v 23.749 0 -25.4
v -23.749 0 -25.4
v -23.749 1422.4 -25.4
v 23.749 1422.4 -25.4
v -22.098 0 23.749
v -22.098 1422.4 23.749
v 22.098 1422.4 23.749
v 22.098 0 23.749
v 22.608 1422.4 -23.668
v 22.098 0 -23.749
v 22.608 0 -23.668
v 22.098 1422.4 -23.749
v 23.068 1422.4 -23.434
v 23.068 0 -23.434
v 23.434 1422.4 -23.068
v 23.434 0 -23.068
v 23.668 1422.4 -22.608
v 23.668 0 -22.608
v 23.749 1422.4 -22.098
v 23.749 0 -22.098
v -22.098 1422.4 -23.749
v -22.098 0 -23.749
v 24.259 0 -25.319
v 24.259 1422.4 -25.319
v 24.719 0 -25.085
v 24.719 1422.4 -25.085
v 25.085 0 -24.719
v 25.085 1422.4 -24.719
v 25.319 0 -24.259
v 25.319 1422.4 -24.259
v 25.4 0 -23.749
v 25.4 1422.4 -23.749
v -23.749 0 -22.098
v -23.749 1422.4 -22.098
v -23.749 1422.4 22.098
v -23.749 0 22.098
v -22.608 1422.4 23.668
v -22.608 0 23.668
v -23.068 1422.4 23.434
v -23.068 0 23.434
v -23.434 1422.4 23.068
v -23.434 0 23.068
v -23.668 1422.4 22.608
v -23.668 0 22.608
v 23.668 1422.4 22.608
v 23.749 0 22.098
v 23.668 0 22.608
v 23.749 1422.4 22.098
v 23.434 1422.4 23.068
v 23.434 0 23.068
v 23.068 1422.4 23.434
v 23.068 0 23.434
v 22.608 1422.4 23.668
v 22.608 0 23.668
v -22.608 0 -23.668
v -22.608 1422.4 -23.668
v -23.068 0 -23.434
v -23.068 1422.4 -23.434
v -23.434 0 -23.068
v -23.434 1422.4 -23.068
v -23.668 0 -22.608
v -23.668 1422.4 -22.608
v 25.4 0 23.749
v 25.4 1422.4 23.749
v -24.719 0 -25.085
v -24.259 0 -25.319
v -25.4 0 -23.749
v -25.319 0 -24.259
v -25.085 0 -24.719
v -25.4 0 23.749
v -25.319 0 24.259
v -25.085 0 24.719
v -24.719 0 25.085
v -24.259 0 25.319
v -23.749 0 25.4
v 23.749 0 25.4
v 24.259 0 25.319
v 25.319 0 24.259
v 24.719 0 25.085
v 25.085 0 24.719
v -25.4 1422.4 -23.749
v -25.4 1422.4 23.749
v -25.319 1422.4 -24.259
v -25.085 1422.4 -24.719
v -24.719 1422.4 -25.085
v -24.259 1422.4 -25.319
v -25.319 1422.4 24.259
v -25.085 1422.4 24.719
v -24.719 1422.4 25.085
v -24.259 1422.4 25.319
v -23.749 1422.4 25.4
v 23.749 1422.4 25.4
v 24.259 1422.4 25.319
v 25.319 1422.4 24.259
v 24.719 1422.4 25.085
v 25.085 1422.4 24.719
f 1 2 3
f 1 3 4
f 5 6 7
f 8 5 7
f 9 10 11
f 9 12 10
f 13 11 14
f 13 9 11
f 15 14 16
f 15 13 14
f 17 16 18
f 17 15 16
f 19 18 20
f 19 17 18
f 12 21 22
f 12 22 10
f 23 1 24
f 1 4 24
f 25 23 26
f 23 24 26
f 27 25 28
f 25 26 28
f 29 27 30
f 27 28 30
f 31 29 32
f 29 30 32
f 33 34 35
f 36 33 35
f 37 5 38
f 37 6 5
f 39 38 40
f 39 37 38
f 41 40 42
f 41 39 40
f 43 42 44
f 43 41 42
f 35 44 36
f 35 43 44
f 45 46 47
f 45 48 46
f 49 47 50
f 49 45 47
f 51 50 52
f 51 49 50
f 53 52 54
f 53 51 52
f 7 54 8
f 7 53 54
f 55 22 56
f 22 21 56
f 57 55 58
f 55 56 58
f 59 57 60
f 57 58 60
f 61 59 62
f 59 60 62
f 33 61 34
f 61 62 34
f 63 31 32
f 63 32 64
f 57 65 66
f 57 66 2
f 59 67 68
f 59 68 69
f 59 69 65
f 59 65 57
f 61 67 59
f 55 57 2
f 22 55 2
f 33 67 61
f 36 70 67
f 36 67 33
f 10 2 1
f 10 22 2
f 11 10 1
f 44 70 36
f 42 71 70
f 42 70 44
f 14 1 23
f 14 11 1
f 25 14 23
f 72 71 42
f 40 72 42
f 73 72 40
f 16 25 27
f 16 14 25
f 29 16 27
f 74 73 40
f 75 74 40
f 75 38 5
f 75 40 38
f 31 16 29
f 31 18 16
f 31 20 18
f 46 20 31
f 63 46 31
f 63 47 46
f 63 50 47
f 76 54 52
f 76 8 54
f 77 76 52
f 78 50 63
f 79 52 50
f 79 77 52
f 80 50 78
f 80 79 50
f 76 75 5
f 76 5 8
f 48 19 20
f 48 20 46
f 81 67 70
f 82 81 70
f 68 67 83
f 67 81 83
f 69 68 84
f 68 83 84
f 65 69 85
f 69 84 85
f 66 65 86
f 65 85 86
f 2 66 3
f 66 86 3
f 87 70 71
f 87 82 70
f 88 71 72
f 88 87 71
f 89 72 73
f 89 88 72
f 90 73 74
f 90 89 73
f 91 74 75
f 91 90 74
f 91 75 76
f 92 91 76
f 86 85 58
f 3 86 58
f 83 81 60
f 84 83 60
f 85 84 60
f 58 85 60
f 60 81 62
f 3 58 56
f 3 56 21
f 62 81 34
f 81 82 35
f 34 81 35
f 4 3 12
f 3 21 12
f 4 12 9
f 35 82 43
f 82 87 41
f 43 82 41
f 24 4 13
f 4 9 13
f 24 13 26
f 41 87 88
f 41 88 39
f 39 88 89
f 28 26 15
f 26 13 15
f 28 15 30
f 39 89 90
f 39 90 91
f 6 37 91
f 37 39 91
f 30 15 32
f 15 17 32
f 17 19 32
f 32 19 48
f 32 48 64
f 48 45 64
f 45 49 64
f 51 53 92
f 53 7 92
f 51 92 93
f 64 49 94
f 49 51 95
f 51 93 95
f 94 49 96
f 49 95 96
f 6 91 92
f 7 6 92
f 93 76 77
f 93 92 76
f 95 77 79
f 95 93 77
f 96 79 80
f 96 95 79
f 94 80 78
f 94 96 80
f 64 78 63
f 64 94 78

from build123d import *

# Parameters (mm, degrees)
F0_W     = 50.8
F0_H     = 50.8
F0_W_2   = 47.498
F0_H_2   = 47.498
F1_DEPTH = 1422.4
F2_R     = 1.651
F3_R     = 1.651


with BuildPart() as f1:
    # F0 (on Front) → F1 (new body)
    with BuildSketch(Plane.XZ):
        Rectangle(F0_W, F0_H)
        Rectangle(F0_W_2, F0_H_2, mode=Mode.SUBTRACT)
    extrude(amount=-F1_DEPTH)

    # F2
    f2_edges = [f1.edges().sort_by_distance(p)[0] for p in [
        (-23.749, 711.2, 23.749),
        (23.749, 711.2, 23.749),
        (-23.749, 711.2, -23.749),
        (23.749, 711.2, -23.749),
    ]]
    fillet(f2_edges, radius=F2_R)

    # F3
    f3_edges = [f1.edges().sort_by_distance(p)[0] for p in [
        (-25.4, 711.2, 25.4),
        (-25.4, 711.2, -25.4),
        (25.4, 711.2, 25.4),
        (25.4, 711.2, -25.4),
    ]]
    fillet(f3_edges, radius=F3_R)


solid = f1.part
